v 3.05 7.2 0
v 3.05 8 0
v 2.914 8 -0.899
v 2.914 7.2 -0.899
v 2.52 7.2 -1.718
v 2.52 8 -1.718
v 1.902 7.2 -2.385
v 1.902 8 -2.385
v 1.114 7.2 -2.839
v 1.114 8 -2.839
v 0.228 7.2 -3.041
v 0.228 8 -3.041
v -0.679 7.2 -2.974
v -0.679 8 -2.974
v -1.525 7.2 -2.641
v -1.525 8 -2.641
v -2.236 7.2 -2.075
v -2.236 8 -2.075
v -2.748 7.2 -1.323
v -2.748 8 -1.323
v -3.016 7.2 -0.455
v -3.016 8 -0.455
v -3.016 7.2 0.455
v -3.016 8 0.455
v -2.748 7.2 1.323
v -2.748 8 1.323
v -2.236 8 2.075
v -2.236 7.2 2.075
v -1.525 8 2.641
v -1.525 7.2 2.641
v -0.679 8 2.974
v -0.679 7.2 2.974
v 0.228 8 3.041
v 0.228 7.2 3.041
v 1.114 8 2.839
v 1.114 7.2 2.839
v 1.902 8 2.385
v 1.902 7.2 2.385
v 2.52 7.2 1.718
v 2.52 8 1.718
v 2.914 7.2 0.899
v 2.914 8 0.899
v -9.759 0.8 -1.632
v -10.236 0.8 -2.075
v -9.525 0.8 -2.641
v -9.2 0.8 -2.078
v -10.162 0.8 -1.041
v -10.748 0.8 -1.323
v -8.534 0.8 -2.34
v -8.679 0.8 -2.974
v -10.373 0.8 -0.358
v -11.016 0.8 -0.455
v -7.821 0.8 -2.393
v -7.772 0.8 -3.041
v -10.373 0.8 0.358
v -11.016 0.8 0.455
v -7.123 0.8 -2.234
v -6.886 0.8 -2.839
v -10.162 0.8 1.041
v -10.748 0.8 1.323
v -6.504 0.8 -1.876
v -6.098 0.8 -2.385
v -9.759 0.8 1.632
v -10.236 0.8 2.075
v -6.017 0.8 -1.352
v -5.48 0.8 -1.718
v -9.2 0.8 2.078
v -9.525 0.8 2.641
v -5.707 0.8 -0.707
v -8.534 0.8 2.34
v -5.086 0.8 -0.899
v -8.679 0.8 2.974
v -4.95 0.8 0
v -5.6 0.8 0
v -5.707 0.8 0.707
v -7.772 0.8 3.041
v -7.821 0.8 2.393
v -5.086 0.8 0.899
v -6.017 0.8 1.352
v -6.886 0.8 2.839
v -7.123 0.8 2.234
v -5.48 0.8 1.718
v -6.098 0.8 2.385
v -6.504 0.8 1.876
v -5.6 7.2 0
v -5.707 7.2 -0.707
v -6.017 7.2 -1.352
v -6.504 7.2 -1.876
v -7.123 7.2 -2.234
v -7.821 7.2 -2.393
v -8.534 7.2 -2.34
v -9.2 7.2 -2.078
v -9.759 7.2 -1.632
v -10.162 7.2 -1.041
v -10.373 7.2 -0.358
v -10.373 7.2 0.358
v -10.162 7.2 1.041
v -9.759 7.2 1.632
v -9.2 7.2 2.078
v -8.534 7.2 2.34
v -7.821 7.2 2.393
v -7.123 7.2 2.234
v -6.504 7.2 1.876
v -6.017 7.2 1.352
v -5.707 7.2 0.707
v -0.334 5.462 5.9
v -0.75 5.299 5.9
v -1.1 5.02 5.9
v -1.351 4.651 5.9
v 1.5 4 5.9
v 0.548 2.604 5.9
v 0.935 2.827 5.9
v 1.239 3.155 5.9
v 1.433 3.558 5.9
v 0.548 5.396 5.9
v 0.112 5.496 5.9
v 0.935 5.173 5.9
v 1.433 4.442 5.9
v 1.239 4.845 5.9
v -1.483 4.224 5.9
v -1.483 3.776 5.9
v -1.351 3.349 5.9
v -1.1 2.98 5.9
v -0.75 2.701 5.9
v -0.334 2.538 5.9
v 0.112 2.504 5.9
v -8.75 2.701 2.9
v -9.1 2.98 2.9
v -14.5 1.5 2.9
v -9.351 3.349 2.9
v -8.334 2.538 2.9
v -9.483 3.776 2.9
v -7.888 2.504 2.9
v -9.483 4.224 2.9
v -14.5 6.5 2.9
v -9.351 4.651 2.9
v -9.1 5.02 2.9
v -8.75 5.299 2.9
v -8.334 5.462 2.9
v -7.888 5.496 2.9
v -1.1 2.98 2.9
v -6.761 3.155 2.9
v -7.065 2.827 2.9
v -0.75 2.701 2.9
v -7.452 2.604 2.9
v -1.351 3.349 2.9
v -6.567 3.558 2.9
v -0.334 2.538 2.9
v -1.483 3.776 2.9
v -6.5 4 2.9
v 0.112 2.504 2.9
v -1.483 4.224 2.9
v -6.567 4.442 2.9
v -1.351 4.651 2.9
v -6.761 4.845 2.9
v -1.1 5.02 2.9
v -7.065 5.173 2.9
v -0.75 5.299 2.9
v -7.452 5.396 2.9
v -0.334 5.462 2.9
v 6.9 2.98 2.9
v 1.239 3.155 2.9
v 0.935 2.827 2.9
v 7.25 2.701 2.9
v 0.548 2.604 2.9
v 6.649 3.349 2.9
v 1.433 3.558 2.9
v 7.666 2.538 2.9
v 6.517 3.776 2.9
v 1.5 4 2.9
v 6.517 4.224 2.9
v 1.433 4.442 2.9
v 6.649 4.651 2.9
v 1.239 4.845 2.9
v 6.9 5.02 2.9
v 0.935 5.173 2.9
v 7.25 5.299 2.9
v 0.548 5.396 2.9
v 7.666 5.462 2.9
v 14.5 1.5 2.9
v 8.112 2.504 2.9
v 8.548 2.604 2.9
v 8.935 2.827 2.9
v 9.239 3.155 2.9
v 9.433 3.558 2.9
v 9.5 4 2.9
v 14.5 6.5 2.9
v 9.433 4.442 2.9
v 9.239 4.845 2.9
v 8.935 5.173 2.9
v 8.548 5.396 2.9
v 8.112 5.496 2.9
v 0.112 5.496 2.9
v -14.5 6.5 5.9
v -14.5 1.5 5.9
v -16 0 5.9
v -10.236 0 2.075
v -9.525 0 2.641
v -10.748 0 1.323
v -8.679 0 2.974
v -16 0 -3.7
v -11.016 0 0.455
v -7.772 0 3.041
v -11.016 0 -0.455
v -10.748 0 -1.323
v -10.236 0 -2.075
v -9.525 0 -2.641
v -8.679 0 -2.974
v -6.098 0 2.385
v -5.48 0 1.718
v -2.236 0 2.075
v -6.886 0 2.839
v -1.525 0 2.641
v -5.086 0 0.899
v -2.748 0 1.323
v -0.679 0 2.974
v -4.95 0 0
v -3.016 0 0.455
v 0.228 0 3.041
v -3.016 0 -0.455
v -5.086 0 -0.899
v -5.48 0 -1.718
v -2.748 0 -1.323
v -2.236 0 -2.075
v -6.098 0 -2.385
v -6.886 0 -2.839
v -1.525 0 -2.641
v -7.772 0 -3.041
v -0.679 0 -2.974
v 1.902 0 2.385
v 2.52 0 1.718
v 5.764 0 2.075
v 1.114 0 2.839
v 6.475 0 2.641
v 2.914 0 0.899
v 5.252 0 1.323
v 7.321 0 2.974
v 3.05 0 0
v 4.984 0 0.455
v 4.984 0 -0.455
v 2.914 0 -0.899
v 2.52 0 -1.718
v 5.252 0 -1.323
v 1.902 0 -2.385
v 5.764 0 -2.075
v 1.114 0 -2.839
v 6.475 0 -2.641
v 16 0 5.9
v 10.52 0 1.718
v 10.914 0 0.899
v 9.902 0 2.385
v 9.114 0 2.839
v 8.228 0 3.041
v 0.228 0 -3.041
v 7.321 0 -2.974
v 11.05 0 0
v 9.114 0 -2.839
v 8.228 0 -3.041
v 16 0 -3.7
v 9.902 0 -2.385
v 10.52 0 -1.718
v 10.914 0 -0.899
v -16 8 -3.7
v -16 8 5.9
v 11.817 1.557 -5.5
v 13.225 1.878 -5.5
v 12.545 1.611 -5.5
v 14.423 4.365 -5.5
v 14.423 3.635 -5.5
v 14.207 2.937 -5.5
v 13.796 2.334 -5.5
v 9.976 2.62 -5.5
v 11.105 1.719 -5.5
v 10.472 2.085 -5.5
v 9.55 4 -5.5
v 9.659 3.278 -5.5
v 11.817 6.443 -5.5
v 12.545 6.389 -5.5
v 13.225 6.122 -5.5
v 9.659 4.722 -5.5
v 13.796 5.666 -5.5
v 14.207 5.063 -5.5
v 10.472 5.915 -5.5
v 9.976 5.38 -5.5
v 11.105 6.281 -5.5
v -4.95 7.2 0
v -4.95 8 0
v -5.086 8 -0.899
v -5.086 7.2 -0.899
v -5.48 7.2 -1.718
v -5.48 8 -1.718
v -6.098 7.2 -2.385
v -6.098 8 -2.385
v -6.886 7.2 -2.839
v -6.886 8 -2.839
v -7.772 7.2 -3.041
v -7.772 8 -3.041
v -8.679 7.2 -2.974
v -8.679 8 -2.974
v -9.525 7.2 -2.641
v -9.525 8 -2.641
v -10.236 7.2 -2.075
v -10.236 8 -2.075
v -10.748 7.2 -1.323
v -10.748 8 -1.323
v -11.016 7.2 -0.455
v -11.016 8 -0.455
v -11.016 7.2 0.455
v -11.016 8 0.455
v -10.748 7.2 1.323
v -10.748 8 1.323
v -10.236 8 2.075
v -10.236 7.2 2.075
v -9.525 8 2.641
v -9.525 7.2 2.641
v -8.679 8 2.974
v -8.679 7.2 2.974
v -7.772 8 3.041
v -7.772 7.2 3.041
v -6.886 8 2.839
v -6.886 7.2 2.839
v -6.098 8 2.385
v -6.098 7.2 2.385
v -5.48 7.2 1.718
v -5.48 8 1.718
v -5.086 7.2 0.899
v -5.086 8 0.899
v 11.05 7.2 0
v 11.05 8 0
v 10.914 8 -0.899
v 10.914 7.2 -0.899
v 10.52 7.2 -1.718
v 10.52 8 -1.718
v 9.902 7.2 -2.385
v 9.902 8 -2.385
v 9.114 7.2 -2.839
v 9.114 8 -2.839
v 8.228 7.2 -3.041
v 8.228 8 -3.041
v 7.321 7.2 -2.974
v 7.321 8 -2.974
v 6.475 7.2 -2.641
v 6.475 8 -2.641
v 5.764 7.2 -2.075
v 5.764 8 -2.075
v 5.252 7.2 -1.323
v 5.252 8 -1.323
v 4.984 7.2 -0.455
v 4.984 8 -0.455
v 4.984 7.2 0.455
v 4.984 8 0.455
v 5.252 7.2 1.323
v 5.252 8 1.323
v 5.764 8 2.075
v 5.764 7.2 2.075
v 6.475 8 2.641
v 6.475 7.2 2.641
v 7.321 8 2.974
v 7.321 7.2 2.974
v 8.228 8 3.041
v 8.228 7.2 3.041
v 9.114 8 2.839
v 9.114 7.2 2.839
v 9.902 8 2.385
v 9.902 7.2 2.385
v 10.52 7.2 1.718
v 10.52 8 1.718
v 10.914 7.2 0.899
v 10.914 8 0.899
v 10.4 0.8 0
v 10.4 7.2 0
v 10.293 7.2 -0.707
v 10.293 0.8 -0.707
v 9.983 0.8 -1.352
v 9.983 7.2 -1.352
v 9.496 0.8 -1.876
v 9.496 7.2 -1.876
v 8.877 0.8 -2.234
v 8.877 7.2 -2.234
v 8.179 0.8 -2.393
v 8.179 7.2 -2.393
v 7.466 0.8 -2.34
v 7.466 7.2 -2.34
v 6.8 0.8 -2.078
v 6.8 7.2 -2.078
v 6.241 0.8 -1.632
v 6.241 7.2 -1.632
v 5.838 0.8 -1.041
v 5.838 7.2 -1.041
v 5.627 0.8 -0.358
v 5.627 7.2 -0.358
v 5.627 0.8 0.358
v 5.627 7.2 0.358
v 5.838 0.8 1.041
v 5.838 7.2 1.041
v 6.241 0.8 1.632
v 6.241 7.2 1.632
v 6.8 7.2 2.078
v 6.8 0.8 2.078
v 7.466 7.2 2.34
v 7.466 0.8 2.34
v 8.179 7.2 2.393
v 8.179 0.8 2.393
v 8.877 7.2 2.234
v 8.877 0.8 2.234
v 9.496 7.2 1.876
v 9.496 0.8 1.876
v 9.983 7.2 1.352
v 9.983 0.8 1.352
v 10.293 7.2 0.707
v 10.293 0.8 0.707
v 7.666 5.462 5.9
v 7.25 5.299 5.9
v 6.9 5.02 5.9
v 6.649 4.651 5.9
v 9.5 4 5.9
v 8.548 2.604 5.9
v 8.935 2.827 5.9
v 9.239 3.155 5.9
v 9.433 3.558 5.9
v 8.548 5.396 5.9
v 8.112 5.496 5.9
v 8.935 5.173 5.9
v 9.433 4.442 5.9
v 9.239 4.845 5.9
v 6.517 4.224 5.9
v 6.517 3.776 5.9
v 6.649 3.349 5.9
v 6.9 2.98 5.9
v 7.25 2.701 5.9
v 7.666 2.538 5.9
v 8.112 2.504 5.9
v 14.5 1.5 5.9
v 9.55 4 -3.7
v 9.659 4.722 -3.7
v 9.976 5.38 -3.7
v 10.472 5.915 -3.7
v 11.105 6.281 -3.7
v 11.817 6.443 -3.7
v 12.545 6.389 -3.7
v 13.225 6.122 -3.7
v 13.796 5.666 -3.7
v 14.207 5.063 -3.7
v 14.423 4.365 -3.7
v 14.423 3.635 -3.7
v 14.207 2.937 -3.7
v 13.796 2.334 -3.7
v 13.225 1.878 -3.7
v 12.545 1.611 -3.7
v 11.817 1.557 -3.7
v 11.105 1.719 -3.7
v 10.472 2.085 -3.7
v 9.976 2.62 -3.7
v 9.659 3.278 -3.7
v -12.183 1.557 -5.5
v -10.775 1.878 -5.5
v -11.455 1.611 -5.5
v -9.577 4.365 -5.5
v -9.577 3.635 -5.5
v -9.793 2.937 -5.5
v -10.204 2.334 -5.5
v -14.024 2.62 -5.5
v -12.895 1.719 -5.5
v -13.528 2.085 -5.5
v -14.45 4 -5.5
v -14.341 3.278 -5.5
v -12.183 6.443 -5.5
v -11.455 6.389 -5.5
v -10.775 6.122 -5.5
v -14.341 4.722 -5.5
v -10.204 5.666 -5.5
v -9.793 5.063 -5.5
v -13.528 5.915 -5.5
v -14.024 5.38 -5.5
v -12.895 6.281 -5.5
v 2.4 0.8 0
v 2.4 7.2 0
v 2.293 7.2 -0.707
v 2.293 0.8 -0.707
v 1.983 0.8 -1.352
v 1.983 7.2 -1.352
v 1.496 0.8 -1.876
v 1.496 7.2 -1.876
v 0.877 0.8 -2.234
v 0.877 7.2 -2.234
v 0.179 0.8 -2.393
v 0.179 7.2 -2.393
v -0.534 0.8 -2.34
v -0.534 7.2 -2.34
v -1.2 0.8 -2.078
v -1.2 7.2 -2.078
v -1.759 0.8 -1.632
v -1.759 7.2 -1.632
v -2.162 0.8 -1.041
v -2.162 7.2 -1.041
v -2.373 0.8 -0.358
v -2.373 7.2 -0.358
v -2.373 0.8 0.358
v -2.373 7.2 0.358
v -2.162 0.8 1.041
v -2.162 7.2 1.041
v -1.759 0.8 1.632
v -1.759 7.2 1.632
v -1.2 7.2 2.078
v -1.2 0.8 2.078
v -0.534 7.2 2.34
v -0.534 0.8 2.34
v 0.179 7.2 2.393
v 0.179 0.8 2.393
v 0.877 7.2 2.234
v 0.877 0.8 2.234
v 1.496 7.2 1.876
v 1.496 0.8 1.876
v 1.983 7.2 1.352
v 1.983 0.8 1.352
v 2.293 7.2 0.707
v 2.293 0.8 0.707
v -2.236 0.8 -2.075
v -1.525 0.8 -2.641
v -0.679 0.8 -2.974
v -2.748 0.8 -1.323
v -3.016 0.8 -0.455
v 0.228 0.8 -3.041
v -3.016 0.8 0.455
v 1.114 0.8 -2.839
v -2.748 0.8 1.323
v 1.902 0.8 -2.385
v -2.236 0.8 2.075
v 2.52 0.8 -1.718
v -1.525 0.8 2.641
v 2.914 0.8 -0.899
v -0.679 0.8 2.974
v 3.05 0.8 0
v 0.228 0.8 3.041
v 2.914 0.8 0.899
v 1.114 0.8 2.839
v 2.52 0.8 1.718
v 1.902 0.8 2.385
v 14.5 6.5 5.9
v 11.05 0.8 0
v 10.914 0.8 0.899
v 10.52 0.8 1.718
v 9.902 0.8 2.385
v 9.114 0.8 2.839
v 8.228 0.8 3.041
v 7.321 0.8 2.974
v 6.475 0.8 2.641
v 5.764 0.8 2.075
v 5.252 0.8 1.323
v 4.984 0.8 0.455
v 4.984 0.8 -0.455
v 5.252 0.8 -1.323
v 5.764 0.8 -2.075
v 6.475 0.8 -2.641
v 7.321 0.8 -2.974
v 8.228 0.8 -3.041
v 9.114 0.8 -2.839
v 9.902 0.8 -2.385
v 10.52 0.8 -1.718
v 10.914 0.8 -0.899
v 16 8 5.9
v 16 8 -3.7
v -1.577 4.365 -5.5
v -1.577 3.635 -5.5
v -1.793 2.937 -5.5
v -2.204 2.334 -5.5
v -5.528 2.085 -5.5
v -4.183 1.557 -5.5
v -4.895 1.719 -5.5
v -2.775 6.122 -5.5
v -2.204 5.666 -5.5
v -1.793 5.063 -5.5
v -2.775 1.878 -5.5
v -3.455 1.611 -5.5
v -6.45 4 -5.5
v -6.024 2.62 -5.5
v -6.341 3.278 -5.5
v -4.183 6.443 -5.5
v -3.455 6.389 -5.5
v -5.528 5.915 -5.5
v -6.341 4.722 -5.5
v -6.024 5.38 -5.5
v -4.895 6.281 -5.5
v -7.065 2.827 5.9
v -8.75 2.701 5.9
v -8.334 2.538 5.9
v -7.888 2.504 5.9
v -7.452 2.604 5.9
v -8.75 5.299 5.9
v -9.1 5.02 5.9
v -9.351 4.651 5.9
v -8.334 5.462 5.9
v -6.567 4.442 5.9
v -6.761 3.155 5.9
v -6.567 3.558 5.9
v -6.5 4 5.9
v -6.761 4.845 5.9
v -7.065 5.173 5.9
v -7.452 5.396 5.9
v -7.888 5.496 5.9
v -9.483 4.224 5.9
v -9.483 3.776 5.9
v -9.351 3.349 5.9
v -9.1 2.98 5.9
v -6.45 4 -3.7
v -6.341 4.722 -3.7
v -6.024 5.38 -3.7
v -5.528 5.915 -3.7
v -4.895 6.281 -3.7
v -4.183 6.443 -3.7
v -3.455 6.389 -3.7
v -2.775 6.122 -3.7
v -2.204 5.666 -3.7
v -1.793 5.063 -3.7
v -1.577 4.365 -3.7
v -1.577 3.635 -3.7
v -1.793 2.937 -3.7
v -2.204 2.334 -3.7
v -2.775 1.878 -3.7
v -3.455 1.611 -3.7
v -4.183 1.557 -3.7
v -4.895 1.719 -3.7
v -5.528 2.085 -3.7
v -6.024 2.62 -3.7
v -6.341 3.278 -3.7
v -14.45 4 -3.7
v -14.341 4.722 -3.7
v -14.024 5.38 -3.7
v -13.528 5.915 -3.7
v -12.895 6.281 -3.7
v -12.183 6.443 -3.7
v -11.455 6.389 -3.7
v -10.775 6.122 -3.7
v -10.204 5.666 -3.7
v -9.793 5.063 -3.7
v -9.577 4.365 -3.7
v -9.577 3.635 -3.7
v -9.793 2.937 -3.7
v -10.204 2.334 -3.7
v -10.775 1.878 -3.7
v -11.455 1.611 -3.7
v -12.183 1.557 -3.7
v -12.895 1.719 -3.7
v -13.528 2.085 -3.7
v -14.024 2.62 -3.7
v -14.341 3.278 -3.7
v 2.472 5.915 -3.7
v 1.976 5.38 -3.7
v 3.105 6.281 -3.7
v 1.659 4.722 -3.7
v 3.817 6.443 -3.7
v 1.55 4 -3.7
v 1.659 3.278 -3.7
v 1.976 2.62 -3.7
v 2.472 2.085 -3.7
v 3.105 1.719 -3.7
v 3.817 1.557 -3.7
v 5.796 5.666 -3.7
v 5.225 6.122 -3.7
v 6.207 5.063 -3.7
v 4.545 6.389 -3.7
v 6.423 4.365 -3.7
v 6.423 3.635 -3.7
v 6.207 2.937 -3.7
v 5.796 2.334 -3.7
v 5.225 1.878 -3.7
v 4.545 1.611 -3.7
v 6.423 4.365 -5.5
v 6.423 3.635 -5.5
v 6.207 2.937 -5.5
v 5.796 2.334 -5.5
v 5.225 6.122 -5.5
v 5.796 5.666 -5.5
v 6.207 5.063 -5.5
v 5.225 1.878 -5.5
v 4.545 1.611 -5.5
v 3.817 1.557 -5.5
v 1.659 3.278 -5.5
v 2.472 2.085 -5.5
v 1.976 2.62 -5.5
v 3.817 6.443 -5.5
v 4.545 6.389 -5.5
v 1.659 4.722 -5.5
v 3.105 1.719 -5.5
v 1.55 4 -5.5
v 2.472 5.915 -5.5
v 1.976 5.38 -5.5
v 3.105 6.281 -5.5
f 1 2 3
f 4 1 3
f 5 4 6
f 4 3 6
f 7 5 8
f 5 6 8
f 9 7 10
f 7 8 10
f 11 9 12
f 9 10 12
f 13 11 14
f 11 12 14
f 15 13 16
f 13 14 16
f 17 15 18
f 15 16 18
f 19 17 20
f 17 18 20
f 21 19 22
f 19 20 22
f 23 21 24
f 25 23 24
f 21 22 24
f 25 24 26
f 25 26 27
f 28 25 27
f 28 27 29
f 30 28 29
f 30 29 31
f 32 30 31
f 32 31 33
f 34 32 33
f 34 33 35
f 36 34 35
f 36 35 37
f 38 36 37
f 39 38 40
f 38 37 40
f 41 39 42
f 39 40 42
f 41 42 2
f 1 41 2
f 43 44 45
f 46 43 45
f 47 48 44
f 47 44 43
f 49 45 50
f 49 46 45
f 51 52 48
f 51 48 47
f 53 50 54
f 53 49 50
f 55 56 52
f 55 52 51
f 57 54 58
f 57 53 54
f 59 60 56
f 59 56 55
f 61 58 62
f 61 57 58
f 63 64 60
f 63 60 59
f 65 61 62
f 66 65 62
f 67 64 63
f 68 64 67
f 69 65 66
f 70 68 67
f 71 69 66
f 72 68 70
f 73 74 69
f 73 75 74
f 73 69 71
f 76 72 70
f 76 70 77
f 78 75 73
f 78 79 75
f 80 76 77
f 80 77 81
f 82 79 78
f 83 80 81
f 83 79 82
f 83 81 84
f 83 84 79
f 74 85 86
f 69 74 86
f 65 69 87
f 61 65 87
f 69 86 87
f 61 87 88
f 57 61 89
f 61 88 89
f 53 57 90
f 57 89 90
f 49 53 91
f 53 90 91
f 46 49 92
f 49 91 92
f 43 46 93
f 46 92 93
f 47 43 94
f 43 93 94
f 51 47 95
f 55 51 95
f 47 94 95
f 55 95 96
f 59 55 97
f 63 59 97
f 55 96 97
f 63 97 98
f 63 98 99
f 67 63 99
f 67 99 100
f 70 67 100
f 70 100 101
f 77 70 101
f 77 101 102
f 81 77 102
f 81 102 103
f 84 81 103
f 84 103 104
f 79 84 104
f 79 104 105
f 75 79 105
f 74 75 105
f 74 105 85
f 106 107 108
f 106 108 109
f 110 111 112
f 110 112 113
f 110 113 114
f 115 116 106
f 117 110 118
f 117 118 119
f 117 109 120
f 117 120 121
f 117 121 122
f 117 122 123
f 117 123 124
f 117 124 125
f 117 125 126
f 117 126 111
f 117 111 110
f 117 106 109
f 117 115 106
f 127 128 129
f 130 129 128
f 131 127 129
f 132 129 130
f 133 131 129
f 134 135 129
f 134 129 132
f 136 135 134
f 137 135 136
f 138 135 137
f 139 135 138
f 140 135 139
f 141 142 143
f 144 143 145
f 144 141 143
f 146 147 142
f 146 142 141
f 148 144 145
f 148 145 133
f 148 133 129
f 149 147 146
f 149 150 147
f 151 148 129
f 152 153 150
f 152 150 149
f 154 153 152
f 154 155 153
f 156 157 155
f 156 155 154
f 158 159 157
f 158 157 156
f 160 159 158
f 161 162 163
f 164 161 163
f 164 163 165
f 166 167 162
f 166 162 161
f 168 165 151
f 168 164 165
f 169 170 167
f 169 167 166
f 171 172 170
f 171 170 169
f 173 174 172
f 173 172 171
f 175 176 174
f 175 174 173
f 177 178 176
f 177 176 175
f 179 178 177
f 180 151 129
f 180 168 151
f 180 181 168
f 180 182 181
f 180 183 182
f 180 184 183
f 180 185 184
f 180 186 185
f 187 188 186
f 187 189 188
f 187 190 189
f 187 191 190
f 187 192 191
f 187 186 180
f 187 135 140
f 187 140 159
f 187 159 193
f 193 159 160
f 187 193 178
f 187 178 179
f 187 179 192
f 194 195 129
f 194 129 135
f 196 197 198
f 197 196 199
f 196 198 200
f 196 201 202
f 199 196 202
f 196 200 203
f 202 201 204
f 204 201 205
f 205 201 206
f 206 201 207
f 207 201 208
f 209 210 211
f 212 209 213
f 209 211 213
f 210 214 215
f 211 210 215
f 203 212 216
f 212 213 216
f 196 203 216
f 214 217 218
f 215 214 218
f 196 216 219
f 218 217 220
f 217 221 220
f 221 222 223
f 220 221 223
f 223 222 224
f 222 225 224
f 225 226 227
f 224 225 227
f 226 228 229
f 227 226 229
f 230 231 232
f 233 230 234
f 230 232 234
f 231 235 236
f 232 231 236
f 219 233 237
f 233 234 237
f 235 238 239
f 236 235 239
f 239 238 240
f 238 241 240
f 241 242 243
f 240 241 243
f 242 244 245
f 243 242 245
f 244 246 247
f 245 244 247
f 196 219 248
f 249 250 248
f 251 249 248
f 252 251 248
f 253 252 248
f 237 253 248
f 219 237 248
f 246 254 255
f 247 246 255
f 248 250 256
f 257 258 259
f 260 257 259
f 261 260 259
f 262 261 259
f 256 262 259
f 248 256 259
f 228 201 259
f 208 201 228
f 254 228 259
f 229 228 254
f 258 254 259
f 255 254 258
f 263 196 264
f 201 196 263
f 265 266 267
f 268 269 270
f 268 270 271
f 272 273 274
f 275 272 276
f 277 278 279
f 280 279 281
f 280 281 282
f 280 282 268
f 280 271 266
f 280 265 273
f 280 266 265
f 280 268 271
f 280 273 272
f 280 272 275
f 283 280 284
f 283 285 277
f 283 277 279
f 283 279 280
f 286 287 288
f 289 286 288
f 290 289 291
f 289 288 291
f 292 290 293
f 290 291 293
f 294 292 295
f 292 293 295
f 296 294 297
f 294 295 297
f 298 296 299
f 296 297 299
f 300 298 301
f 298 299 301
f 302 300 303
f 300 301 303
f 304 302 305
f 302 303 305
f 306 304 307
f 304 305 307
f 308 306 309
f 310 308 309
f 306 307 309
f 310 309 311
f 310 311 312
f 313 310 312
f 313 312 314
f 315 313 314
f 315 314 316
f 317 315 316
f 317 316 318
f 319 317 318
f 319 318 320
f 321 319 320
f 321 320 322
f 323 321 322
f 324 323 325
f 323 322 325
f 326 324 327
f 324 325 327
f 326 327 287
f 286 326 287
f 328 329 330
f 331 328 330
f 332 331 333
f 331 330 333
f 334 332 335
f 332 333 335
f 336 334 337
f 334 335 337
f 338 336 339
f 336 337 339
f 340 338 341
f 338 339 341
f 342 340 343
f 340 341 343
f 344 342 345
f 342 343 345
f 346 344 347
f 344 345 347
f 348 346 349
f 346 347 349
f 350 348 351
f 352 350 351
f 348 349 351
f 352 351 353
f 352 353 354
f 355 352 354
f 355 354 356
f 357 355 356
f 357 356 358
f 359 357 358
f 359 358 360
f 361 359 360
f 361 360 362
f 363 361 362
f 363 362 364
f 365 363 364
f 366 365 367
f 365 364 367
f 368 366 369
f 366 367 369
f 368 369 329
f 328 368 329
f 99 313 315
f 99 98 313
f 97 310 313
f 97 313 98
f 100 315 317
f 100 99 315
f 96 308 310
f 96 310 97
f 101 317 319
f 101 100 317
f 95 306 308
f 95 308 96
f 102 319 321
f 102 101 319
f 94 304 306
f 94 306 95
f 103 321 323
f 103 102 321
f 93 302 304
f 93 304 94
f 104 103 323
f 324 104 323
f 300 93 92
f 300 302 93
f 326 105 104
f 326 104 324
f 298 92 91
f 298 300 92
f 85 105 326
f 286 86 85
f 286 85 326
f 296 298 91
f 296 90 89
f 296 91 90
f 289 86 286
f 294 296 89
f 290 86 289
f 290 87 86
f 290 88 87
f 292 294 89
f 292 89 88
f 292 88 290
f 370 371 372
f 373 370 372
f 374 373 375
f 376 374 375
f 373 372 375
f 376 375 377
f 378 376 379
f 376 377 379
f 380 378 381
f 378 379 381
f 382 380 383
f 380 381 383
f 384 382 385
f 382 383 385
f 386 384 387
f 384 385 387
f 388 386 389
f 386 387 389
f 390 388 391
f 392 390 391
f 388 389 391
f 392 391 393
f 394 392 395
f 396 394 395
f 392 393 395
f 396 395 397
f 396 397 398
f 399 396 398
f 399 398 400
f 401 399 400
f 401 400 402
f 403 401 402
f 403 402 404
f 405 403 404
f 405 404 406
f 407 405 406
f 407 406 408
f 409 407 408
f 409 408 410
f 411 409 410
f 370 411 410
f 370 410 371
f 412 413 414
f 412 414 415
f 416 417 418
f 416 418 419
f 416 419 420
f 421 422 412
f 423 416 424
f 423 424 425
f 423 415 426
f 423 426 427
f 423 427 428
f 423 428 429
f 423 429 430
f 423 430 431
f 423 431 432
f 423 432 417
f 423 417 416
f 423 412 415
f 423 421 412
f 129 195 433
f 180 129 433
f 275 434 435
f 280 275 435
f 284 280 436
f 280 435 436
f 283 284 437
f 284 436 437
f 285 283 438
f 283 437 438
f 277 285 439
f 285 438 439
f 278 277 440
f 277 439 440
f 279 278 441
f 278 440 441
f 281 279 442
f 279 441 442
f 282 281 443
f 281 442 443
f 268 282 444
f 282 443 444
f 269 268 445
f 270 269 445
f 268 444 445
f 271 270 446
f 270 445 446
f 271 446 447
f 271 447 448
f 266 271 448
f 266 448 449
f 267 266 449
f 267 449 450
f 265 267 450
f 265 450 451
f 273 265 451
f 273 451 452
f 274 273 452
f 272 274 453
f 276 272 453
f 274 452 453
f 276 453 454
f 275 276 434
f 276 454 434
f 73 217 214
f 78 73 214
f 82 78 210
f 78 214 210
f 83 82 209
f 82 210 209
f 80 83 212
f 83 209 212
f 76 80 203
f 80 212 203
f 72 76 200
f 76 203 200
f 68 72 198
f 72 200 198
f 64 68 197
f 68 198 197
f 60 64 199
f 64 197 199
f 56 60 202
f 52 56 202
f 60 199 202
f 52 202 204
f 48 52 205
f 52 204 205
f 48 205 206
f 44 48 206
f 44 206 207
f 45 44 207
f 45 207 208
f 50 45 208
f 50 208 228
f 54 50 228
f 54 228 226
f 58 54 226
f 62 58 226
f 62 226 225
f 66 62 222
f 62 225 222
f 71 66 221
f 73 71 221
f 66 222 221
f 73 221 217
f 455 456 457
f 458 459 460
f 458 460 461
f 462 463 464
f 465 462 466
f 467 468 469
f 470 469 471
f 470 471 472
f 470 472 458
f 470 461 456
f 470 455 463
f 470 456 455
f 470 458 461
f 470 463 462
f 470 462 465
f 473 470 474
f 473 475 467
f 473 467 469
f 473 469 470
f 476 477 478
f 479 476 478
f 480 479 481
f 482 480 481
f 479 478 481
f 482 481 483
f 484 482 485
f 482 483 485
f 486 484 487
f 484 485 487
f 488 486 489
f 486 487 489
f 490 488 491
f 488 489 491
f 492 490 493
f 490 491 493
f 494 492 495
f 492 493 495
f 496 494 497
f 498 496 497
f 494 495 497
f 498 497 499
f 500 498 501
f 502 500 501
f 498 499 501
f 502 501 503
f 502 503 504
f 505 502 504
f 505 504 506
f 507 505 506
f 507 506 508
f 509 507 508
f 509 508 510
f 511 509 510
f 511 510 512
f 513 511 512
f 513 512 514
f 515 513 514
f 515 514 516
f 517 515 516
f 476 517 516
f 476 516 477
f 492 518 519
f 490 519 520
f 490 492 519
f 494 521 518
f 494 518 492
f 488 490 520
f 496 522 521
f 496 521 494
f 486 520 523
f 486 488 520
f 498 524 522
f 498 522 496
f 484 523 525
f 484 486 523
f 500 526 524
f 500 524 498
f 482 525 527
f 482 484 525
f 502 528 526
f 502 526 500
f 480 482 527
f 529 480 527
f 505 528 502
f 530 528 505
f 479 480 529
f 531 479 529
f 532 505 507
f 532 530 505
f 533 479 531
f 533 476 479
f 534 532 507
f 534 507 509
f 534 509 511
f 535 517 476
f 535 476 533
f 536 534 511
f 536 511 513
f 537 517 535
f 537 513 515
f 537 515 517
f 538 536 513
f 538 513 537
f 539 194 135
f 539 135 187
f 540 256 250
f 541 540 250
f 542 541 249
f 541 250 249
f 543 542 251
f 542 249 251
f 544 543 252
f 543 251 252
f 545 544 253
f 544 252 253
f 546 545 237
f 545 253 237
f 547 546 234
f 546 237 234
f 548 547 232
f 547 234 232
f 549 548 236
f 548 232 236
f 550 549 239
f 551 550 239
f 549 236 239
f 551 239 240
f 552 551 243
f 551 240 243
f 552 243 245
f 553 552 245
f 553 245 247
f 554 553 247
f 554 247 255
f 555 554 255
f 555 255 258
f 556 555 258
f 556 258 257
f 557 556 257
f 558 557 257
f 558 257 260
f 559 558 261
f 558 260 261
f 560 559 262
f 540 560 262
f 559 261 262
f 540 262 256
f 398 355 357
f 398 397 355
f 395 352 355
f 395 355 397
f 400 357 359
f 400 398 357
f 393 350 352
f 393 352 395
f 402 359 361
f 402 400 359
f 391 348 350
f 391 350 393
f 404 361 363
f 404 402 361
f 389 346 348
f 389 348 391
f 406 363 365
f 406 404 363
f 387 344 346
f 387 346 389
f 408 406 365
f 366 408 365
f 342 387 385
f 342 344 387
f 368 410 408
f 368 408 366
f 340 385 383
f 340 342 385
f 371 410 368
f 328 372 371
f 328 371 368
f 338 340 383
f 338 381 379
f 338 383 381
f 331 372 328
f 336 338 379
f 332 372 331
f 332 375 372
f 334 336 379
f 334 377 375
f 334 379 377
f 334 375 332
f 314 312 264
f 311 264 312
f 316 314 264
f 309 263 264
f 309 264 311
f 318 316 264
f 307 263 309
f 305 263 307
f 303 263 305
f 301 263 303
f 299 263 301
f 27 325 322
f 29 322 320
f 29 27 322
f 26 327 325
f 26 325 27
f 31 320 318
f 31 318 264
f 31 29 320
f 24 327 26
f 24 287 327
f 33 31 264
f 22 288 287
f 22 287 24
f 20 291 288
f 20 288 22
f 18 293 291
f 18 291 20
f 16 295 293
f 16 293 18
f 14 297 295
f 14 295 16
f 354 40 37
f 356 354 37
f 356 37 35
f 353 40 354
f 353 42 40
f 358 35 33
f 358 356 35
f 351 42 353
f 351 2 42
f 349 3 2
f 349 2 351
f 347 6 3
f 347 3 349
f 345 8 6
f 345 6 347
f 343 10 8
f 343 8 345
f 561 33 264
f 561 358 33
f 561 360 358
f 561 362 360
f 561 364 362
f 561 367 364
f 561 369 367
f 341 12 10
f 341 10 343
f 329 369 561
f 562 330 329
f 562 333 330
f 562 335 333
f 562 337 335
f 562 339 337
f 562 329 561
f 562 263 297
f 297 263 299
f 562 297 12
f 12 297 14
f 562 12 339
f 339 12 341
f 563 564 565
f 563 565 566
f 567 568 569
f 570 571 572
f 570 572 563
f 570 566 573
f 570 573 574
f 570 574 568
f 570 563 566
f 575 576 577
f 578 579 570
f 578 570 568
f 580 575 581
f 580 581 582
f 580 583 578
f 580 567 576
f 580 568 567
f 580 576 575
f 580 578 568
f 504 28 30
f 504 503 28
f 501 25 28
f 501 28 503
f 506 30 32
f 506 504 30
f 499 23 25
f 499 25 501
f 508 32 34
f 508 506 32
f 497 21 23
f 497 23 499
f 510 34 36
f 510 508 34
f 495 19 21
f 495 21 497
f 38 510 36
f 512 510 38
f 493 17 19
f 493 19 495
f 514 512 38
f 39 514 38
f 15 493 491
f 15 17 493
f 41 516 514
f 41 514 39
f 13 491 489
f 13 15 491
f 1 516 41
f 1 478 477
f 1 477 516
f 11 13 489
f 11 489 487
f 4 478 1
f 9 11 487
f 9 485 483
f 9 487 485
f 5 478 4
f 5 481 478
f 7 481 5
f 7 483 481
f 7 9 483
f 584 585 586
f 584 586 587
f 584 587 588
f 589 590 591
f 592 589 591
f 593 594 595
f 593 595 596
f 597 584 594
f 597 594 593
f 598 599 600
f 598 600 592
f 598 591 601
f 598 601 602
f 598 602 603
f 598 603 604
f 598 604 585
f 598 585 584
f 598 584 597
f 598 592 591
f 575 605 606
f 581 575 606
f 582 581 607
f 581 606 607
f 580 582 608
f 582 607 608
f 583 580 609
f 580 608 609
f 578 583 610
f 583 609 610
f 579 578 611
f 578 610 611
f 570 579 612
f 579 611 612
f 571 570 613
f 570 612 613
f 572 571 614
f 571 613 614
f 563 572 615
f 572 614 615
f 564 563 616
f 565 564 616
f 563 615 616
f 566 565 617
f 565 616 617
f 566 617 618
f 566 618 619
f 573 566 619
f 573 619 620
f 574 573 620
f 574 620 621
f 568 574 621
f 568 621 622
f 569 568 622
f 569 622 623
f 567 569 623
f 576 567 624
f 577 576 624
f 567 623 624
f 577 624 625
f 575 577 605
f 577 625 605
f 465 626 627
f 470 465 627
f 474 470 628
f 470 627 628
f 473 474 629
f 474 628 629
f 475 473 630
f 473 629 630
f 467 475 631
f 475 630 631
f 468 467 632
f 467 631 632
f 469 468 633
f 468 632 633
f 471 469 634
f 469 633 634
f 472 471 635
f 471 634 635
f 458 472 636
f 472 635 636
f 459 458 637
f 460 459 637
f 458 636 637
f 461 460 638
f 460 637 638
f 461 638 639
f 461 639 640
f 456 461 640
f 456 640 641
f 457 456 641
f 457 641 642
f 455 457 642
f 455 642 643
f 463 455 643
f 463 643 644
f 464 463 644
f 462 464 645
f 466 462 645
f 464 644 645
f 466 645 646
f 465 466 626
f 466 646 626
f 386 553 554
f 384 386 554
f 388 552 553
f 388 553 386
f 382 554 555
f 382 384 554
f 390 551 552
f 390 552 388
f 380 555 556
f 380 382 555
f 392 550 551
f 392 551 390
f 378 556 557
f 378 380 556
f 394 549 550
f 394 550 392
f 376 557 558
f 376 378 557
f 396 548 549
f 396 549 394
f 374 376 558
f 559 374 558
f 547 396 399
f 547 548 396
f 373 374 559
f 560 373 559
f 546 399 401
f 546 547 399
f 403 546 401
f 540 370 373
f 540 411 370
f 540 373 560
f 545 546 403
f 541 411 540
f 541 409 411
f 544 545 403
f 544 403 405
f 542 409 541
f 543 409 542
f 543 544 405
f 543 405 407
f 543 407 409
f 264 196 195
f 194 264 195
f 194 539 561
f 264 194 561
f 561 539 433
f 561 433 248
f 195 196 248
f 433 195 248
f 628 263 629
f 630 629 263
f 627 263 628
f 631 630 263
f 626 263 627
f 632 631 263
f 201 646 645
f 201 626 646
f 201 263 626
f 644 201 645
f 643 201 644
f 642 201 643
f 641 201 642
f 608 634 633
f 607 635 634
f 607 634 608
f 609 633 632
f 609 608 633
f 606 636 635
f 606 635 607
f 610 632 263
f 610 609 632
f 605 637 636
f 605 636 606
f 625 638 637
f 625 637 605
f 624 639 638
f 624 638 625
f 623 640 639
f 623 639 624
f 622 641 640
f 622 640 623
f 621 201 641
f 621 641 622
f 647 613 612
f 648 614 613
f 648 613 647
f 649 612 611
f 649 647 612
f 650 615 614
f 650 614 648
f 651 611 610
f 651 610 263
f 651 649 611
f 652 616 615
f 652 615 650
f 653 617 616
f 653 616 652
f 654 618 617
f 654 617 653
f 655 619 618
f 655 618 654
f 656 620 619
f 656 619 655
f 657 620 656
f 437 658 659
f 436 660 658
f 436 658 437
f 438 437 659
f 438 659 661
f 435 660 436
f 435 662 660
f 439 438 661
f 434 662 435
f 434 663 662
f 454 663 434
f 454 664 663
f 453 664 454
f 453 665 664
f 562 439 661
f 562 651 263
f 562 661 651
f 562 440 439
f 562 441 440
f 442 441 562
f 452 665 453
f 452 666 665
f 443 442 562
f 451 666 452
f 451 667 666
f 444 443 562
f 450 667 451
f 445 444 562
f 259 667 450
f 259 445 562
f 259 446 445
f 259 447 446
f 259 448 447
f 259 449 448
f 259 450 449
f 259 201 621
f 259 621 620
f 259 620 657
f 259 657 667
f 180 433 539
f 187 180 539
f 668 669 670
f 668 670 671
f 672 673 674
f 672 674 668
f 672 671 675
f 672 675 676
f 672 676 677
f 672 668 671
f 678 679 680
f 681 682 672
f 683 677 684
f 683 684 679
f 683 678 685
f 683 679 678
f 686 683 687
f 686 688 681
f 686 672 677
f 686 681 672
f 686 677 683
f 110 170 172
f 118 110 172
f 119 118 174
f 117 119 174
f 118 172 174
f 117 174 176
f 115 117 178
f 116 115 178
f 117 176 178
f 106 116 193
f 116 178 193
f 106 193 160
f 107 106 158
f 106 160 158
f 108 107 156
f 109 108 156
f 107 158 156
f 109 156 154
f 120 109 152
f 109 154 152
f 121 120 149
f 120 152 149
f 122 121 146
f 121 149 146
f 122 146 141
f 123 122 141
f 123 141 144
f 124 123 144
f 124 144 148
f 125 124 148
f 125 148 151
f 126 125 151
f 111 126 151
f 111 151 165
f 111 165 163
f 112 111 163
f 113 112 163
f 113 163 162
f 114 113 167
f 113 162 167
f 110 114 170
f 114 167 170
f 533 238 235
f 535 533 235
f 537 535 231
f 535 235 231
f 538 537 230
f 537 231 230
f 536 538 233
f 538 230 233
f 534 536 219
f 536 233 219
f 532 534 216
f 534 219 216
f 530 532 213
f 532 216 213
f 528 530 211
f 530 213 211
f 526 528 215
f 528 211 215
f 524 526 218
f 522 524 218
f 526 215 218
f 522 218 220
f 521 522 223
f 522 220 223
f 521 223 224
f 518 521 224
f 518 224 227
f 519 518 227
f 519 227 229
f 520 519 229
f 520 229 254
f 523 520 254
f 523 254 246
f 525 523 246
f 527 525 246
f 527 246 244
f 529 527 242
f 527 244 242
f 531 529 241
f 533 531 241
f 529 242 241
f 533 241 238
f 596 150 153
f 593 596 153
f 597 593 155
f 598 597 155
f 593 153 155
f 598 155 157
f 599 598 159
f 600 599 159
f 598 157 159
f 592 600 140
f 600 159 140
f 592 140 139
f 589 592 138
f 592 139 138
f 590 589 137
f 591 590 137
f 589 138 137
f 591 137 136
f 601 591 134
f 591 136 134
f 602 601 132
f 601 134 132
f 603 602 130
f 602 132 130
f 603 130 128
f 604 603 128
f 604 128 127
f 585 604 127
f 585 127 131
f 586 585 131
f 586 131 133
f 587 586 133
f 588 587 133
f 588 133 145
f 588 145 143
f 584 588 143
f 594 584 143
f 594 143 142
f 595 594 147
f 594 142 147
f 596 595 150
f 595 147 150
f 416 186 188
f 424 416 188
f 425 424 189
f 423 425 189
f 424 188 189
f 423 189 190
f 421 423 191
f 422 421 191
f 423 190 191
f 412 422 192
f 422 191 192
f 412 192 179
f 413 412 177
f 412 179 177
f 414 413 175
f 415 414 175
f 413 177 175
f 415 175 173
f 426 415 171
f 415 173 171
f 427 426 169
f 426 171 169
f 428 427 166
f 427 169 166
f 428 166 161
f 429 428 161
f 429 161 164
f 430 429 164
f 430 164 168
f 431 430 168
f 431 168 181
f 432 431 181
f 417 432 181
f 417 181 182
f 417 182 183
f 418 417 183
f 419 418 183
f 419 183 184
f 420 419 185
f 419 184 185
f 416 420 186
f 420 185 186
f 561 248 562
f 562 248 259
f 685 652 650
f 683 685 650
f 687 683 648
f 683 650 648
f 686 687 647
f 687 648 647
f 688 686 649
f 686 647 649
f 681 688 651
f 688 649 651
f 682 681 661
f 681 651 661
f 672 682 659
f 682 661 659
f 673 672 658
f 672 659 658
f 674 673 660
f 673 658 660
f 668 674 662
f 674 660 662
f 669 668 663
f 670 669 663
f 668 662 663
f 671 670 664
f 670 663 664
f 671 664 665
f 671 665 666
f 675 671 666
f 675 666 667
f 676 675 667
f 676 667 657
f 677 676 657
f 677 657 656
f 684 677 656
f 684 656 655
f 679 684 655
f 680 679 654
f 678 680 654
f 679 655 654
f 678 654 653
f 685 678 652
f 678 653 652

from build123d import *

# Parameters (mm, degrees)
SKETCH1_W           = 32
SKETCH1_H           = 9.6
BOSS_EXTRUDE3_DEPTH = 8
SKETCH2_R           = 2.4
CUT_EXTRUDE6_DEPTH  = 7.8
SKETCH3_R           = 3.05
CUT_EXTRUDE7_DEPTH  = 0.8
SKETCH4_R           = 3.05
CUT_EXTRUDE8_DEPTH  = 0.8
SKETCH5_R           = 2.45
BOSS_EXTRUDE4_DEPTH = 1.8
SKETCH6_W           = 29
SKETCH6_H           = 5
CUT_EXTRUDE9_DEPTH  = 3
SKETCH7_R           = 1.5
BOSS_EXTRUDE5_DEPTH = 3


with BuildPart() as part:
    # Sketch1 → Boss-Extrude3 (new body)
    with BuildSketch(Plane(origin=(0, 0, 0), x_dir=(1, 0, 0), z_dir=(0, 1, 0))):
        with Locations((0, -1.1)):
            Rectangle(SKETCH1_W, SKETCH1_H)
    extrude(amount=BOSS_EXTRUDE3_DEPTH)

    # Sketch2 → Cut-Extrude6 (cut)
    with BuildSketch(Plane(origin=(0, 8, 0), x_dir=(1, 0, 0), z_dir=(0, 1, 0))):
        Circle(SKETCH2_R)
        with Locations((8, 0)):
            Circle(SKETCH2_R)
        with Locations((-8, 0)):
            Circle(SKETCH2_R)
    extrude(amount=-CUT_EXTRUDE6_DEPTH, mode=Mode.SUBTRACT)

    # Sketch3 → Cut-Extrude7 (cut)
    with BuildSketch(Plane(origin=(0, 8, 0), x_dir=(1, 0, 0), z_dir=(0, 1, 0))):
        Circle(SKETCH3_R)
        with Locations((8, 0)):
            Circle(SKETCH3_R)
        with Locations((-8, 0)):
            Circle(SKETCH3_R)
    extrude(amount=-CUT_EXTRUDE7_DEPTH, mode=Mode.SUBTRACT)

    # Sketch4 → Cut-Extrude8 (cut)
    with BuildSketch(Plane.XZ):
        Circle(SKETCH4_R)
        with Locations((8, 0)):
            Circle(SKETCH4_R)
        with Locations((-8, 0)):
            Circle(SKETCH4_R)
    extrude(amount=-CUT_EXTRUDE8_DEPTH, mode=Mode.SUBTRACT)

    # Sketch5 → Boss-Extrude4 (add)
    with BuildSketch(Plane(origin=(0, 0, -3.7), x_dir=(-1, 0, 0), z_dir=(0, 0, -1))):
        with Locations((-12, 4)):
            Circle(SKETCH5_R)
        with Locations((-4, 4)):
            Circle(SKETCH5_R)
        with Locations((4, 4)):
            Circle(SKETCH5_R)
        with Locations((12, 4)):
            Circle(SKETCH5_R)
    extrude(amount=BOSS_EXTRUDE4_DEPTH)

    # Sketch6 → Cut-Extrude9 (cut)
    with BuildSketch(Plane.XY.offset(5.9)):
        with Locations((0, 4)):
            Rectangle(SKETCH6_W, SKETCH6_H)
    extrude(amount=-CUT_EXTRUDE9_DEPTH, mode=Mode.SUBTRACT)

    # Sketch7 → Boss-Extrude5 (add)
    with BuildSketch(Plane.XY.offset(2.9)):
        with Locations((-8, 4)):
            Circle(SKETCH7_R)
        with Locations((0, 4)):
            Circle(SKETCH7_R)
        with Locations((8, 4)):
            Circle(SKETCH7_R)
    extrude(amount=BOSS_EXTRUDE5_DEPTH)


solid = part.part
